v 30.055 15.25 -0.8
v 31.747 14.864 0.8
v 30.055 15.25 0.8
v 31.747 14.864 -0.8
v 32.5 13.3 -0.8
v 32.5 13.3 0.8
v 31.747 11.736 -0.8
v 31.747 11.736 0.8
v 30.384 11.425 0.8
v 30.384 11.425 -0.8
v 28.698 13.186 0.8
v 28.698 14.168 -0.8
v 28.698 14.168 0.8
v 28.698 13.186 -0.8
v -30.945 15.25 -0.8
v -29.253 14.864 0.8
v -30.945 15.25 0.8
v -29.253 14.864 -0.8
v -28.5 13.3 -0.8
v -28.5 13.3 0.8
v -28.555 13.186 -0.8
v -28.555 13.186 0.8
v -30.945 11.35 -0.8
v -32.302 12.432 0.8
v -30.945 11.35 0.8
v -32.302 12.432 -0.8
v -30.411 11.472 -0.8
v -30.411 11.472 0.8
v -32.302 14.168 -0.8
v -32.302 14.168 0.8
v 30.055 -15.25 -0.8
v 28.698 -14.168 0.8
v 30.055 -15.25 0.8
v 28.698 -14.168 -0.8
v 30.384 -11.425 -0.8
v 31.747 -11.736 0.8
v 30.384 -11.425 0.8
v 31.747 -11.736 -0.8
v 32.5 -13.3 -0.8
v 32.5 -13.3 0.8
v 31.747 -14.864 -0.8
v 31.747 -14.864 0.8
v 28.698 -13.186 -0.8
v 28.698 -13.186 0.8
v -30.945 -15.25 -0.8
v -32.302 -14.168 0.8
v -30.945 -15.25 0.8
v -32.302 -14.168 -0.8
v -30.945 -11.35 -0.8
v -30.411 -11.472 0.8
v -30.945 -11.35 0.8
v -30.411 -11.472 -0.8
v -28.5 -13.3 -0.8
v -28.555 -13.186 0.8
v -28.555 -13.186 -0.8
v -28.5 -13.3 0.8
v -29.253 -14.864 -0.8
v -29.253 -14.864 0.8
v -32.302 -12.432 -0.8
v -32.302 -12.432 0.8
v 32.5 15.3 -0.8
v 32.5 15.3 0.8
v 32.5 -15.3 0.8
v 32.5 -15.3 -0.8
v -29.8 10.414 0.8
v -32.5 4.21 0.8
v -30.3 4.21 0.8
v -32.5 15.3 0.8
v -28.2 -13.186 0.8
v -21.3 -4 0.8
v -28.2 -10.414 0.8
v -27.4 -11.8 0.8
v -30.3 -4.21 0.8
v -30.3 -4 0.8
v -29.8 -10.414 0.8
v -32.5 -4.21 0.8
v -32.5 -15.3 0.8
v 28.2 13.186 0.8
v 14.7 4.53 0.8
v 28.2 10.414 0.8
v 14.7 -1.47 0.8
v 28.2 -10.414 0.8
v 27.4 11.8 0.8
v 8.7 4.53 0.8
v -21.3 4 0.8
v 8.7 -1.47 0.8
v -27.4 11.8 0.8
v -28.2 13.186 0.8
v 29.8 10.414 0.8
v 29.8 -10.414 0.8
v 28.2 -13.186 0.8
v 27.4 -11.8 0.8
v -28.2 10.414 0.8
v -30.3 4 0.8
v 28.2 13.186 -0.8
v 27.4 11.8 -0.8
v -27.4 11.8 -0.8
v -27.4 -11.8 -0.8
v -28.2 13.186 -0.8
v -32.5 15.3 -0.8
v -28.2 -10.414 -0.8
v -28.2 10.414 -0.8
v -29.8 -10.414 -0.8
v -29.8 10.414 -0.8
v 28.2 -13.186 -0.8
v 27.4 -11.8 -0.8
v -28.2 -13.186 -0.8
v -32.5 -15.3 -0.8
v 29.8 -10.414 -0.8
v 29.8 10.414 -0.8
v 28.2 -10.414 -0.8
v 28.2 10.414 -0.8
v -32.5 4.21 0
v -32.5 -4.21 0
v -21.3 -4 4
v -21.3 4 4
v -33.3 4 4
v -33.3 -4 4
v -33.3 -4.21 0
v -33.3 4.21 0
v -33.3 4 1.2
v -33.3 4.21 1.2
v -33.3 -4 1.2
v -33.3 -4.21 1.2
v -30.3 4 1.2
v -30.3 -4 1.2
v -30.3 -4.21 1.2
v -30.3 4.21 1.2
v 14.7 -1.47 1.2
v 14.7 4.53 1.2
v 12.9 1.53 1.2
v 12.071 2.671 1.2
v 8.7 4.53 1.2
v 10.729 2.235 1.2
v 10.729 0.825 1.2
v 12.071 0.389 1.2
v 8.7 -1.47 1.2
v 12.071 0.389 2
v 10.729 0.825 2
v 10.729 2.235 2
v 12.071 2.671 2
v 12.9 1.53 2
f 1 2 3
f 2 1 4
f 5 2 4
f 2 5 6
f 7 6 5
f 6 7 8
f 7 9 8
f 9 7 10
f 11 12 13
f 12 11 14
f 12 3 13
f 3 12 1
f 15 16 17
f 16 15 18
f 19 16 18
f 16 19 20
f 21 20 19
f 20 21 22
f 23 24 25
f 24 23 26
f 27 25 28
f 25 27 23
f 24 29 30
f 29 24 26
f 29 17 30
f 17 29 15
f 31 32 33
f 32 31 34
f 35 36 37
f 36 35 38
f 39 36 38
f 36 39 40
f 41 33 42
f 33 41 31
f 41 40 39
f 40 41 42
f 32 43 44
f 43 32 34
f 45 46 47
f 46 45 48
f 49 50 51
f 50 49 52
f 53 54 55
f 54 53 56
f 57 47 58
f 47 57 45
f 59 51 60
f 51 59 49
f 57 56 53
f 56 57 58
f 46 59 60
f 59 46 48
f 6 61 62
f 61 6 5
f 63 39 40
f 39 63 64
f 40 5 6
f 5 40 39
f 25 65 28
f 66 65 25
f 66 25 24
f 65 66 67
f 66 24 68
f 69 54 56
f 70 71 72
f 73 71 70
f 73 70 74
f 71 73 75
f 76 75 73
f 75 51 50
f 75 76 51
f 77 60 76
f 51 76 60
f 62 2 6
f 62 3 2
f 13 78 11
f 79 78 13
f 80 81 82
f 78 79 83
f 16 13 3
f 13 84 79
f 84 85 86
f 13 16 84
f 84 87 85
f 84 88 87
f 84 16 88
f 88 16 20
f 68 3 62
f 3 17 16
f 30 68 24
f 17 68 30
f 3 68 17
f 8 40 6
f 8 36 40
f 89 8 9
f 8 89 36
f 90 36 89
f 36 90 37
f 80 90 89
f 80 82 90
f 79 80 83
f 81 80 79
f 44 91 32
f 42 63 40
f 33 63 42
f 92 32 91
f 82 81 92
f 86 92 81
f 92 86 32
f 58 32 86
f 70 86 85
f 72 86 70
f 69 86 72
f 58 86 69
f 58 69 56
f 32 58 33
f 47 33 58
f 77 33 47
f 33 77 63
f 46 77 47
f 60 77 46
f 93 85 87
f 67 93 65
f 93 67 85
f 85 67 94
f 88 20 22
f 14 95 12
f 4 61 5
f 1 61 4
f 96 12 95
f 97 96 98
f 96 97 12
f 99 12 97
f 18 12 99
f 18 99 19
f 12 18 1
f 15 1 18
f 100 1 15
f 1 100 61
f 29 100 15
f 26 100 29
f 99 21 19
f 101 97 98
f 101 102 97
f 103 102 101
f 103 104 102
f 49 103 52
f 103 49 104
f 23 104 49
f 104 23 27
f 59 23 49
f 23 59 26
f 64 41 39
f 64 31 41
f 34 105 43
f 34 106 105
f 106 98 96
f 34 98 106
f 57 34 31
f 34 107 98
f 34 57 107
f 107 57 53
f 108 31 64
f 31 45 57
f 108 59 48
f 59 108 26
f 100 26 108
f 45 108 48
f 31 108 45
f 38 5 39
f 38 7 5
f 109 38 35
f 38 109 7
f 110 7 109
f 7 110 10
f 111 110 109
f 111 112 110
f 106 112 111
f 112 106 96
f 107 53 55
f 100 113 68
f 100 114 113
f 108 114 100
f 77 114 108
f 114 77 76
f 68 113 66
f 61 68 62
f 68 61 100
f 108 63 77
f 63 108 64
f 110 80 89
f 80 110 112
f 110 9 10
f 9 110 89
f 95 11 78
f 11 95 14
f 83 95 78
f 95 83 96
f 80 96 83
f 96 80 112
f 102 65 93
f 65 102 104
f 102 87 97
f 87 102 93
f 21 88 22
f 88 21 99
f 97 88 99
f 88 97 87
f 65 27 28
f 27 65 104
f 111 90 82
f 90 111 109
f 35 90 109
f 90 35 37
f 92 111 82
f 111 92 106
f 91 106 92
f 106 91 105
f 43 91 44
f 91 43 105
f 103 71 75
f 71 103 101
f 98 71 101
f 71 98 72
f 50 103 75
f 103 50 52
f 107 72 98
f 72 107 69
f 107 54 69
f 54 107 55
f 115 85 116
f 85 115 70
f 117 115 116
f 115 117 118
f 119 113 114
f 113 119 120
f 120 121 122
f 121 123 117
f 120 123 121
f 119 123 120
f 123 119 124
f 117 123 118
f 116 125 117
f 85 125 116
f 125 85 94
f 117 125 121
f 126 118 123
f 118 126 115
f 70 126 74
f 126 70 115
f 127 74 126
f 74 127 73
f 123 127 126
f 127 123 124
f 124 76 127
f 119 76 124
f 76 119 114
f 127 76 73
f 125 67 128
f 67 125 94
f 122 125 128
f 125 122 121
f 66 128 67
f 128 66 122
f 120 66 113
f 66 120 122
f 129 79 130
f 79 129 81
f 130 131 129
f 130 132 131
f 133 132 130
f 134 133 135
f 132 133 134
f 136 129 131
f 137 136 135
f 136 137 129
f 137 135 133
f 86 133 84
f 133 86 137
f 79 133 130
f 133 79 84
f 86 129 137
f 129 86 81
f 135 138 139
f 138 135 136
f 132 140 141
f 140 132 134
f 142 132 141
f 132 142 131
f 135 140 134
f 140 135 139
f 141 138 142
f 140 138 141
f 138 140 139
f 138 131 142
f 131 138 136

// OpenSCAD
// Parameters
board_L = 65.0; //[32.5:130.0:0.1]
board_W = 30.6; //[15.3:61.2:0.1]
board_T = 1.6; //[0.8:3.2:0.1]
fillet_r = 2.0; //[0.8:4.0:0.1]
hole_d = 3.2; //[2.0:4.5:0.1]
hole_edge_offset = 3.5; //[2.0:7.0:0.1]
copper_t = 0.05; //[0.02:0.15:0.01]
silk_t = 0.05; //[0.02:0.15:0.01]
overlap = 0.8; //[0.5:2.0:0.1]
conn_body_L = 12.0; //[6.0:24.0:0.1]
conn_body_W = 8.0; //[4.0:16.0:0.1]
conn_body_H = 4.0; //[2.0:10.0:0.1]
pin_L = 3.0; //[1.5:6.0:0.1]
pin_W = 0.8; //[0.4:1.6:0.05]
pin_H = 1.2; //[0.6:2.4:0.1]
pin_pitch = 2.54; //[1.27:5.08:0.01]
sensor_body_L = 6.0; //[3.0:12.0:0.1]
sensor_body_W = 6.0; //[3.0:12.0:0.1]
sensor_body_H = 1.2; //[0.6:3.0:0.1]
sensor_cap_r = 1.2; //[0.6:2.5:0.1]
sensor_cap_h = 0.8; //[0.4:2.0:0.1]
pad_L = 2.0; //[1.0:4.0:0.1]
pad_W = 1.2; //[0.6:2.5:0.1]

// Base Shapes
module pcb_main_board_raw() {
  cube([board_L, board_W, board_T], center=true);
}

module corner_cut_cyl() {
  cylinder(r=fillet_r, h=board_T + 2*overlap, center=true);
}

module mount_hole_cyl() {
  cylinder(r=hole_d/2, h=board_T + 2*overlap, center=true);
}

module copper_pad_base() {
  cube([pad_L, pad_W, copper_t], center=true);
}

module silk_rect_base() {
  cube([board_L*0.55, board_W*0.18, silk_t], center=true);
}

module silk_line_base() {
  cube([board_L*0.35, board_W*0.03, silk_t], center=true);
}

module connector_body_base() {
  cube([conn_body_L, conn_body_W, conn_body_H], center=true);
}

module connector_pin_base() {
  cube([pin_L, pin_W, pin_H], center=true);
}

module sensor_body_base() {
  cube([sensor_body_L, sensor_body_W, sensor_body_H], center=true);
}

module sensor_cap_base() {
  cylinder(r=sensor_cap_r, h=sensor_cap_h, center=true);
}

// Operations
module pcb_with_corner_fillets() {
  difference() {
    pcb_main_board_raw();
    union() {
      translate([board_L/2 - fillet_r, board_W/2 - fillet_r, 0]) corner_cut_cyl();
      translate([-(board_L/2 - fillet_r), board_W/2 - fillet_r, 0]) corner_cut_cyl();
      translate([board_L/2 - fillet_r, -(board_W/2 - fillet_r), 0]) corner_cut_cyl();
      translate([-(board_L/2 - fillet_r), -(board_W/2 - fillet_r), 0]) corner_cut_cyl();
    }
  }
}

module pcb_main_board() {
  difference() {
    pcb_with_corner_fillets();
    union() {
      translate([board_L/2 - hole_edge_offset, board_W/2 - hole_edge_offset, 0]) mount_hole_cyl();
      translate([-(board_L/2 - hole_edge_offset), board_W/2 - hole_edge_offset, 0]) mount_hole_cyl();
      translate([board_L/2 - hole_edge_offset, -(board_W/2 - hole_edge_offset), 0]) mount_hole_cyl();
      translate([-(board_L/2 - hole_edge_offset), -(board_W/2 - hole_edge_offset), 0]) mount_hole_cyl();
    }
  }
}

module copper_pads() {
  union() {
    translate([-board_L*0.18, -board_W*0.18, board_T/2 + copper_t/2 - overlap]) copper_pad_base();
    translate([-board_L*0.18, -board_W*0.18 + pin_pitch, board_T/2 + copper_t/2 - overlap]) copper_pad_base();
    translate([-board_L*0.18, -board_W*0.18 + 2*pin_pitch, board_T/2 + copper_t/2 - overlap]) copper_pad_base();
    translate([-board_L*0.18, -board_W*0.18 + 3*pin_pitch, board_T/2 + copper_t/2 - overlap]) copper_pad_base();
  }
}

module silkscreen_markings() {
  union() {
    translate([board_L*0.05, board_W*0.22, board_T/2 + silk_t/2 - overlap]) silk_rect_base();
    translate([board_L*0.05, board_W*0.05, board_T/2 + silk_t/2 - overlap]) silk_line_base();
  }
}

module connectors() {
  union() {
    translate([-board_L/2 + conn_body_L/2 - overlap, 0, board_T/2 + conn_body_H/2 - overlap]) connector_body_base();
    translate([-board_L/2 + pin_L/2 - overlap, -1.5*pin_pitch, board_T/2 + pin_H/2 - overlap]) connector_pin_base();
    translate([-board_L/2 + pin_L/2 - overlap, -0.5*pin_pitch, board_T/2 + pin_H/2 - overlap]) connector_pin_base();
    translate([-board_L/2 + pin_L/2 - overlap, 0.5*pin_pitch, board_T/2 + pin_H/2 - overlap]) connector_pin_base();
    translate([-board_L/2 + pin_L/2 - overlap, 1.5*pin_pitch, board_T/2 + pin_H/2 - overlap]) connector_pin_base();
  }
}

module sensor_package_components() {
  union() {
    translate([board_L*0.18, board_W*0.05, board_T/2 + sensor_body_H/2 - overlap]) sensor_body_base();
    translate([board_L*0.18, board_W*0.05, board_T/2 + sensor_body_H - overlap + sensor_cap_h/2]) sensor_cap_base();
  }
}

// Final Assembly
module pcb_assembly_union() {
  union() {
    color([0.0, 0.4, 0.2]) pcb_main_board(); // PCB color
    color([0.72, 0.45, 0.2]) copper_pads(); // Copper pads color
    color([0.85, 0.85, 0.8]) silkscreen_markings(); // Silkscreen color
    color([0.15, 0.2, 0.35]) connectors(); // Connectors color
    color([0.15, 0.2, 0.35]) sensor_package_components(); // Sensor package color
  }
}

// Render the final assembly
pcb_assembly_union();
